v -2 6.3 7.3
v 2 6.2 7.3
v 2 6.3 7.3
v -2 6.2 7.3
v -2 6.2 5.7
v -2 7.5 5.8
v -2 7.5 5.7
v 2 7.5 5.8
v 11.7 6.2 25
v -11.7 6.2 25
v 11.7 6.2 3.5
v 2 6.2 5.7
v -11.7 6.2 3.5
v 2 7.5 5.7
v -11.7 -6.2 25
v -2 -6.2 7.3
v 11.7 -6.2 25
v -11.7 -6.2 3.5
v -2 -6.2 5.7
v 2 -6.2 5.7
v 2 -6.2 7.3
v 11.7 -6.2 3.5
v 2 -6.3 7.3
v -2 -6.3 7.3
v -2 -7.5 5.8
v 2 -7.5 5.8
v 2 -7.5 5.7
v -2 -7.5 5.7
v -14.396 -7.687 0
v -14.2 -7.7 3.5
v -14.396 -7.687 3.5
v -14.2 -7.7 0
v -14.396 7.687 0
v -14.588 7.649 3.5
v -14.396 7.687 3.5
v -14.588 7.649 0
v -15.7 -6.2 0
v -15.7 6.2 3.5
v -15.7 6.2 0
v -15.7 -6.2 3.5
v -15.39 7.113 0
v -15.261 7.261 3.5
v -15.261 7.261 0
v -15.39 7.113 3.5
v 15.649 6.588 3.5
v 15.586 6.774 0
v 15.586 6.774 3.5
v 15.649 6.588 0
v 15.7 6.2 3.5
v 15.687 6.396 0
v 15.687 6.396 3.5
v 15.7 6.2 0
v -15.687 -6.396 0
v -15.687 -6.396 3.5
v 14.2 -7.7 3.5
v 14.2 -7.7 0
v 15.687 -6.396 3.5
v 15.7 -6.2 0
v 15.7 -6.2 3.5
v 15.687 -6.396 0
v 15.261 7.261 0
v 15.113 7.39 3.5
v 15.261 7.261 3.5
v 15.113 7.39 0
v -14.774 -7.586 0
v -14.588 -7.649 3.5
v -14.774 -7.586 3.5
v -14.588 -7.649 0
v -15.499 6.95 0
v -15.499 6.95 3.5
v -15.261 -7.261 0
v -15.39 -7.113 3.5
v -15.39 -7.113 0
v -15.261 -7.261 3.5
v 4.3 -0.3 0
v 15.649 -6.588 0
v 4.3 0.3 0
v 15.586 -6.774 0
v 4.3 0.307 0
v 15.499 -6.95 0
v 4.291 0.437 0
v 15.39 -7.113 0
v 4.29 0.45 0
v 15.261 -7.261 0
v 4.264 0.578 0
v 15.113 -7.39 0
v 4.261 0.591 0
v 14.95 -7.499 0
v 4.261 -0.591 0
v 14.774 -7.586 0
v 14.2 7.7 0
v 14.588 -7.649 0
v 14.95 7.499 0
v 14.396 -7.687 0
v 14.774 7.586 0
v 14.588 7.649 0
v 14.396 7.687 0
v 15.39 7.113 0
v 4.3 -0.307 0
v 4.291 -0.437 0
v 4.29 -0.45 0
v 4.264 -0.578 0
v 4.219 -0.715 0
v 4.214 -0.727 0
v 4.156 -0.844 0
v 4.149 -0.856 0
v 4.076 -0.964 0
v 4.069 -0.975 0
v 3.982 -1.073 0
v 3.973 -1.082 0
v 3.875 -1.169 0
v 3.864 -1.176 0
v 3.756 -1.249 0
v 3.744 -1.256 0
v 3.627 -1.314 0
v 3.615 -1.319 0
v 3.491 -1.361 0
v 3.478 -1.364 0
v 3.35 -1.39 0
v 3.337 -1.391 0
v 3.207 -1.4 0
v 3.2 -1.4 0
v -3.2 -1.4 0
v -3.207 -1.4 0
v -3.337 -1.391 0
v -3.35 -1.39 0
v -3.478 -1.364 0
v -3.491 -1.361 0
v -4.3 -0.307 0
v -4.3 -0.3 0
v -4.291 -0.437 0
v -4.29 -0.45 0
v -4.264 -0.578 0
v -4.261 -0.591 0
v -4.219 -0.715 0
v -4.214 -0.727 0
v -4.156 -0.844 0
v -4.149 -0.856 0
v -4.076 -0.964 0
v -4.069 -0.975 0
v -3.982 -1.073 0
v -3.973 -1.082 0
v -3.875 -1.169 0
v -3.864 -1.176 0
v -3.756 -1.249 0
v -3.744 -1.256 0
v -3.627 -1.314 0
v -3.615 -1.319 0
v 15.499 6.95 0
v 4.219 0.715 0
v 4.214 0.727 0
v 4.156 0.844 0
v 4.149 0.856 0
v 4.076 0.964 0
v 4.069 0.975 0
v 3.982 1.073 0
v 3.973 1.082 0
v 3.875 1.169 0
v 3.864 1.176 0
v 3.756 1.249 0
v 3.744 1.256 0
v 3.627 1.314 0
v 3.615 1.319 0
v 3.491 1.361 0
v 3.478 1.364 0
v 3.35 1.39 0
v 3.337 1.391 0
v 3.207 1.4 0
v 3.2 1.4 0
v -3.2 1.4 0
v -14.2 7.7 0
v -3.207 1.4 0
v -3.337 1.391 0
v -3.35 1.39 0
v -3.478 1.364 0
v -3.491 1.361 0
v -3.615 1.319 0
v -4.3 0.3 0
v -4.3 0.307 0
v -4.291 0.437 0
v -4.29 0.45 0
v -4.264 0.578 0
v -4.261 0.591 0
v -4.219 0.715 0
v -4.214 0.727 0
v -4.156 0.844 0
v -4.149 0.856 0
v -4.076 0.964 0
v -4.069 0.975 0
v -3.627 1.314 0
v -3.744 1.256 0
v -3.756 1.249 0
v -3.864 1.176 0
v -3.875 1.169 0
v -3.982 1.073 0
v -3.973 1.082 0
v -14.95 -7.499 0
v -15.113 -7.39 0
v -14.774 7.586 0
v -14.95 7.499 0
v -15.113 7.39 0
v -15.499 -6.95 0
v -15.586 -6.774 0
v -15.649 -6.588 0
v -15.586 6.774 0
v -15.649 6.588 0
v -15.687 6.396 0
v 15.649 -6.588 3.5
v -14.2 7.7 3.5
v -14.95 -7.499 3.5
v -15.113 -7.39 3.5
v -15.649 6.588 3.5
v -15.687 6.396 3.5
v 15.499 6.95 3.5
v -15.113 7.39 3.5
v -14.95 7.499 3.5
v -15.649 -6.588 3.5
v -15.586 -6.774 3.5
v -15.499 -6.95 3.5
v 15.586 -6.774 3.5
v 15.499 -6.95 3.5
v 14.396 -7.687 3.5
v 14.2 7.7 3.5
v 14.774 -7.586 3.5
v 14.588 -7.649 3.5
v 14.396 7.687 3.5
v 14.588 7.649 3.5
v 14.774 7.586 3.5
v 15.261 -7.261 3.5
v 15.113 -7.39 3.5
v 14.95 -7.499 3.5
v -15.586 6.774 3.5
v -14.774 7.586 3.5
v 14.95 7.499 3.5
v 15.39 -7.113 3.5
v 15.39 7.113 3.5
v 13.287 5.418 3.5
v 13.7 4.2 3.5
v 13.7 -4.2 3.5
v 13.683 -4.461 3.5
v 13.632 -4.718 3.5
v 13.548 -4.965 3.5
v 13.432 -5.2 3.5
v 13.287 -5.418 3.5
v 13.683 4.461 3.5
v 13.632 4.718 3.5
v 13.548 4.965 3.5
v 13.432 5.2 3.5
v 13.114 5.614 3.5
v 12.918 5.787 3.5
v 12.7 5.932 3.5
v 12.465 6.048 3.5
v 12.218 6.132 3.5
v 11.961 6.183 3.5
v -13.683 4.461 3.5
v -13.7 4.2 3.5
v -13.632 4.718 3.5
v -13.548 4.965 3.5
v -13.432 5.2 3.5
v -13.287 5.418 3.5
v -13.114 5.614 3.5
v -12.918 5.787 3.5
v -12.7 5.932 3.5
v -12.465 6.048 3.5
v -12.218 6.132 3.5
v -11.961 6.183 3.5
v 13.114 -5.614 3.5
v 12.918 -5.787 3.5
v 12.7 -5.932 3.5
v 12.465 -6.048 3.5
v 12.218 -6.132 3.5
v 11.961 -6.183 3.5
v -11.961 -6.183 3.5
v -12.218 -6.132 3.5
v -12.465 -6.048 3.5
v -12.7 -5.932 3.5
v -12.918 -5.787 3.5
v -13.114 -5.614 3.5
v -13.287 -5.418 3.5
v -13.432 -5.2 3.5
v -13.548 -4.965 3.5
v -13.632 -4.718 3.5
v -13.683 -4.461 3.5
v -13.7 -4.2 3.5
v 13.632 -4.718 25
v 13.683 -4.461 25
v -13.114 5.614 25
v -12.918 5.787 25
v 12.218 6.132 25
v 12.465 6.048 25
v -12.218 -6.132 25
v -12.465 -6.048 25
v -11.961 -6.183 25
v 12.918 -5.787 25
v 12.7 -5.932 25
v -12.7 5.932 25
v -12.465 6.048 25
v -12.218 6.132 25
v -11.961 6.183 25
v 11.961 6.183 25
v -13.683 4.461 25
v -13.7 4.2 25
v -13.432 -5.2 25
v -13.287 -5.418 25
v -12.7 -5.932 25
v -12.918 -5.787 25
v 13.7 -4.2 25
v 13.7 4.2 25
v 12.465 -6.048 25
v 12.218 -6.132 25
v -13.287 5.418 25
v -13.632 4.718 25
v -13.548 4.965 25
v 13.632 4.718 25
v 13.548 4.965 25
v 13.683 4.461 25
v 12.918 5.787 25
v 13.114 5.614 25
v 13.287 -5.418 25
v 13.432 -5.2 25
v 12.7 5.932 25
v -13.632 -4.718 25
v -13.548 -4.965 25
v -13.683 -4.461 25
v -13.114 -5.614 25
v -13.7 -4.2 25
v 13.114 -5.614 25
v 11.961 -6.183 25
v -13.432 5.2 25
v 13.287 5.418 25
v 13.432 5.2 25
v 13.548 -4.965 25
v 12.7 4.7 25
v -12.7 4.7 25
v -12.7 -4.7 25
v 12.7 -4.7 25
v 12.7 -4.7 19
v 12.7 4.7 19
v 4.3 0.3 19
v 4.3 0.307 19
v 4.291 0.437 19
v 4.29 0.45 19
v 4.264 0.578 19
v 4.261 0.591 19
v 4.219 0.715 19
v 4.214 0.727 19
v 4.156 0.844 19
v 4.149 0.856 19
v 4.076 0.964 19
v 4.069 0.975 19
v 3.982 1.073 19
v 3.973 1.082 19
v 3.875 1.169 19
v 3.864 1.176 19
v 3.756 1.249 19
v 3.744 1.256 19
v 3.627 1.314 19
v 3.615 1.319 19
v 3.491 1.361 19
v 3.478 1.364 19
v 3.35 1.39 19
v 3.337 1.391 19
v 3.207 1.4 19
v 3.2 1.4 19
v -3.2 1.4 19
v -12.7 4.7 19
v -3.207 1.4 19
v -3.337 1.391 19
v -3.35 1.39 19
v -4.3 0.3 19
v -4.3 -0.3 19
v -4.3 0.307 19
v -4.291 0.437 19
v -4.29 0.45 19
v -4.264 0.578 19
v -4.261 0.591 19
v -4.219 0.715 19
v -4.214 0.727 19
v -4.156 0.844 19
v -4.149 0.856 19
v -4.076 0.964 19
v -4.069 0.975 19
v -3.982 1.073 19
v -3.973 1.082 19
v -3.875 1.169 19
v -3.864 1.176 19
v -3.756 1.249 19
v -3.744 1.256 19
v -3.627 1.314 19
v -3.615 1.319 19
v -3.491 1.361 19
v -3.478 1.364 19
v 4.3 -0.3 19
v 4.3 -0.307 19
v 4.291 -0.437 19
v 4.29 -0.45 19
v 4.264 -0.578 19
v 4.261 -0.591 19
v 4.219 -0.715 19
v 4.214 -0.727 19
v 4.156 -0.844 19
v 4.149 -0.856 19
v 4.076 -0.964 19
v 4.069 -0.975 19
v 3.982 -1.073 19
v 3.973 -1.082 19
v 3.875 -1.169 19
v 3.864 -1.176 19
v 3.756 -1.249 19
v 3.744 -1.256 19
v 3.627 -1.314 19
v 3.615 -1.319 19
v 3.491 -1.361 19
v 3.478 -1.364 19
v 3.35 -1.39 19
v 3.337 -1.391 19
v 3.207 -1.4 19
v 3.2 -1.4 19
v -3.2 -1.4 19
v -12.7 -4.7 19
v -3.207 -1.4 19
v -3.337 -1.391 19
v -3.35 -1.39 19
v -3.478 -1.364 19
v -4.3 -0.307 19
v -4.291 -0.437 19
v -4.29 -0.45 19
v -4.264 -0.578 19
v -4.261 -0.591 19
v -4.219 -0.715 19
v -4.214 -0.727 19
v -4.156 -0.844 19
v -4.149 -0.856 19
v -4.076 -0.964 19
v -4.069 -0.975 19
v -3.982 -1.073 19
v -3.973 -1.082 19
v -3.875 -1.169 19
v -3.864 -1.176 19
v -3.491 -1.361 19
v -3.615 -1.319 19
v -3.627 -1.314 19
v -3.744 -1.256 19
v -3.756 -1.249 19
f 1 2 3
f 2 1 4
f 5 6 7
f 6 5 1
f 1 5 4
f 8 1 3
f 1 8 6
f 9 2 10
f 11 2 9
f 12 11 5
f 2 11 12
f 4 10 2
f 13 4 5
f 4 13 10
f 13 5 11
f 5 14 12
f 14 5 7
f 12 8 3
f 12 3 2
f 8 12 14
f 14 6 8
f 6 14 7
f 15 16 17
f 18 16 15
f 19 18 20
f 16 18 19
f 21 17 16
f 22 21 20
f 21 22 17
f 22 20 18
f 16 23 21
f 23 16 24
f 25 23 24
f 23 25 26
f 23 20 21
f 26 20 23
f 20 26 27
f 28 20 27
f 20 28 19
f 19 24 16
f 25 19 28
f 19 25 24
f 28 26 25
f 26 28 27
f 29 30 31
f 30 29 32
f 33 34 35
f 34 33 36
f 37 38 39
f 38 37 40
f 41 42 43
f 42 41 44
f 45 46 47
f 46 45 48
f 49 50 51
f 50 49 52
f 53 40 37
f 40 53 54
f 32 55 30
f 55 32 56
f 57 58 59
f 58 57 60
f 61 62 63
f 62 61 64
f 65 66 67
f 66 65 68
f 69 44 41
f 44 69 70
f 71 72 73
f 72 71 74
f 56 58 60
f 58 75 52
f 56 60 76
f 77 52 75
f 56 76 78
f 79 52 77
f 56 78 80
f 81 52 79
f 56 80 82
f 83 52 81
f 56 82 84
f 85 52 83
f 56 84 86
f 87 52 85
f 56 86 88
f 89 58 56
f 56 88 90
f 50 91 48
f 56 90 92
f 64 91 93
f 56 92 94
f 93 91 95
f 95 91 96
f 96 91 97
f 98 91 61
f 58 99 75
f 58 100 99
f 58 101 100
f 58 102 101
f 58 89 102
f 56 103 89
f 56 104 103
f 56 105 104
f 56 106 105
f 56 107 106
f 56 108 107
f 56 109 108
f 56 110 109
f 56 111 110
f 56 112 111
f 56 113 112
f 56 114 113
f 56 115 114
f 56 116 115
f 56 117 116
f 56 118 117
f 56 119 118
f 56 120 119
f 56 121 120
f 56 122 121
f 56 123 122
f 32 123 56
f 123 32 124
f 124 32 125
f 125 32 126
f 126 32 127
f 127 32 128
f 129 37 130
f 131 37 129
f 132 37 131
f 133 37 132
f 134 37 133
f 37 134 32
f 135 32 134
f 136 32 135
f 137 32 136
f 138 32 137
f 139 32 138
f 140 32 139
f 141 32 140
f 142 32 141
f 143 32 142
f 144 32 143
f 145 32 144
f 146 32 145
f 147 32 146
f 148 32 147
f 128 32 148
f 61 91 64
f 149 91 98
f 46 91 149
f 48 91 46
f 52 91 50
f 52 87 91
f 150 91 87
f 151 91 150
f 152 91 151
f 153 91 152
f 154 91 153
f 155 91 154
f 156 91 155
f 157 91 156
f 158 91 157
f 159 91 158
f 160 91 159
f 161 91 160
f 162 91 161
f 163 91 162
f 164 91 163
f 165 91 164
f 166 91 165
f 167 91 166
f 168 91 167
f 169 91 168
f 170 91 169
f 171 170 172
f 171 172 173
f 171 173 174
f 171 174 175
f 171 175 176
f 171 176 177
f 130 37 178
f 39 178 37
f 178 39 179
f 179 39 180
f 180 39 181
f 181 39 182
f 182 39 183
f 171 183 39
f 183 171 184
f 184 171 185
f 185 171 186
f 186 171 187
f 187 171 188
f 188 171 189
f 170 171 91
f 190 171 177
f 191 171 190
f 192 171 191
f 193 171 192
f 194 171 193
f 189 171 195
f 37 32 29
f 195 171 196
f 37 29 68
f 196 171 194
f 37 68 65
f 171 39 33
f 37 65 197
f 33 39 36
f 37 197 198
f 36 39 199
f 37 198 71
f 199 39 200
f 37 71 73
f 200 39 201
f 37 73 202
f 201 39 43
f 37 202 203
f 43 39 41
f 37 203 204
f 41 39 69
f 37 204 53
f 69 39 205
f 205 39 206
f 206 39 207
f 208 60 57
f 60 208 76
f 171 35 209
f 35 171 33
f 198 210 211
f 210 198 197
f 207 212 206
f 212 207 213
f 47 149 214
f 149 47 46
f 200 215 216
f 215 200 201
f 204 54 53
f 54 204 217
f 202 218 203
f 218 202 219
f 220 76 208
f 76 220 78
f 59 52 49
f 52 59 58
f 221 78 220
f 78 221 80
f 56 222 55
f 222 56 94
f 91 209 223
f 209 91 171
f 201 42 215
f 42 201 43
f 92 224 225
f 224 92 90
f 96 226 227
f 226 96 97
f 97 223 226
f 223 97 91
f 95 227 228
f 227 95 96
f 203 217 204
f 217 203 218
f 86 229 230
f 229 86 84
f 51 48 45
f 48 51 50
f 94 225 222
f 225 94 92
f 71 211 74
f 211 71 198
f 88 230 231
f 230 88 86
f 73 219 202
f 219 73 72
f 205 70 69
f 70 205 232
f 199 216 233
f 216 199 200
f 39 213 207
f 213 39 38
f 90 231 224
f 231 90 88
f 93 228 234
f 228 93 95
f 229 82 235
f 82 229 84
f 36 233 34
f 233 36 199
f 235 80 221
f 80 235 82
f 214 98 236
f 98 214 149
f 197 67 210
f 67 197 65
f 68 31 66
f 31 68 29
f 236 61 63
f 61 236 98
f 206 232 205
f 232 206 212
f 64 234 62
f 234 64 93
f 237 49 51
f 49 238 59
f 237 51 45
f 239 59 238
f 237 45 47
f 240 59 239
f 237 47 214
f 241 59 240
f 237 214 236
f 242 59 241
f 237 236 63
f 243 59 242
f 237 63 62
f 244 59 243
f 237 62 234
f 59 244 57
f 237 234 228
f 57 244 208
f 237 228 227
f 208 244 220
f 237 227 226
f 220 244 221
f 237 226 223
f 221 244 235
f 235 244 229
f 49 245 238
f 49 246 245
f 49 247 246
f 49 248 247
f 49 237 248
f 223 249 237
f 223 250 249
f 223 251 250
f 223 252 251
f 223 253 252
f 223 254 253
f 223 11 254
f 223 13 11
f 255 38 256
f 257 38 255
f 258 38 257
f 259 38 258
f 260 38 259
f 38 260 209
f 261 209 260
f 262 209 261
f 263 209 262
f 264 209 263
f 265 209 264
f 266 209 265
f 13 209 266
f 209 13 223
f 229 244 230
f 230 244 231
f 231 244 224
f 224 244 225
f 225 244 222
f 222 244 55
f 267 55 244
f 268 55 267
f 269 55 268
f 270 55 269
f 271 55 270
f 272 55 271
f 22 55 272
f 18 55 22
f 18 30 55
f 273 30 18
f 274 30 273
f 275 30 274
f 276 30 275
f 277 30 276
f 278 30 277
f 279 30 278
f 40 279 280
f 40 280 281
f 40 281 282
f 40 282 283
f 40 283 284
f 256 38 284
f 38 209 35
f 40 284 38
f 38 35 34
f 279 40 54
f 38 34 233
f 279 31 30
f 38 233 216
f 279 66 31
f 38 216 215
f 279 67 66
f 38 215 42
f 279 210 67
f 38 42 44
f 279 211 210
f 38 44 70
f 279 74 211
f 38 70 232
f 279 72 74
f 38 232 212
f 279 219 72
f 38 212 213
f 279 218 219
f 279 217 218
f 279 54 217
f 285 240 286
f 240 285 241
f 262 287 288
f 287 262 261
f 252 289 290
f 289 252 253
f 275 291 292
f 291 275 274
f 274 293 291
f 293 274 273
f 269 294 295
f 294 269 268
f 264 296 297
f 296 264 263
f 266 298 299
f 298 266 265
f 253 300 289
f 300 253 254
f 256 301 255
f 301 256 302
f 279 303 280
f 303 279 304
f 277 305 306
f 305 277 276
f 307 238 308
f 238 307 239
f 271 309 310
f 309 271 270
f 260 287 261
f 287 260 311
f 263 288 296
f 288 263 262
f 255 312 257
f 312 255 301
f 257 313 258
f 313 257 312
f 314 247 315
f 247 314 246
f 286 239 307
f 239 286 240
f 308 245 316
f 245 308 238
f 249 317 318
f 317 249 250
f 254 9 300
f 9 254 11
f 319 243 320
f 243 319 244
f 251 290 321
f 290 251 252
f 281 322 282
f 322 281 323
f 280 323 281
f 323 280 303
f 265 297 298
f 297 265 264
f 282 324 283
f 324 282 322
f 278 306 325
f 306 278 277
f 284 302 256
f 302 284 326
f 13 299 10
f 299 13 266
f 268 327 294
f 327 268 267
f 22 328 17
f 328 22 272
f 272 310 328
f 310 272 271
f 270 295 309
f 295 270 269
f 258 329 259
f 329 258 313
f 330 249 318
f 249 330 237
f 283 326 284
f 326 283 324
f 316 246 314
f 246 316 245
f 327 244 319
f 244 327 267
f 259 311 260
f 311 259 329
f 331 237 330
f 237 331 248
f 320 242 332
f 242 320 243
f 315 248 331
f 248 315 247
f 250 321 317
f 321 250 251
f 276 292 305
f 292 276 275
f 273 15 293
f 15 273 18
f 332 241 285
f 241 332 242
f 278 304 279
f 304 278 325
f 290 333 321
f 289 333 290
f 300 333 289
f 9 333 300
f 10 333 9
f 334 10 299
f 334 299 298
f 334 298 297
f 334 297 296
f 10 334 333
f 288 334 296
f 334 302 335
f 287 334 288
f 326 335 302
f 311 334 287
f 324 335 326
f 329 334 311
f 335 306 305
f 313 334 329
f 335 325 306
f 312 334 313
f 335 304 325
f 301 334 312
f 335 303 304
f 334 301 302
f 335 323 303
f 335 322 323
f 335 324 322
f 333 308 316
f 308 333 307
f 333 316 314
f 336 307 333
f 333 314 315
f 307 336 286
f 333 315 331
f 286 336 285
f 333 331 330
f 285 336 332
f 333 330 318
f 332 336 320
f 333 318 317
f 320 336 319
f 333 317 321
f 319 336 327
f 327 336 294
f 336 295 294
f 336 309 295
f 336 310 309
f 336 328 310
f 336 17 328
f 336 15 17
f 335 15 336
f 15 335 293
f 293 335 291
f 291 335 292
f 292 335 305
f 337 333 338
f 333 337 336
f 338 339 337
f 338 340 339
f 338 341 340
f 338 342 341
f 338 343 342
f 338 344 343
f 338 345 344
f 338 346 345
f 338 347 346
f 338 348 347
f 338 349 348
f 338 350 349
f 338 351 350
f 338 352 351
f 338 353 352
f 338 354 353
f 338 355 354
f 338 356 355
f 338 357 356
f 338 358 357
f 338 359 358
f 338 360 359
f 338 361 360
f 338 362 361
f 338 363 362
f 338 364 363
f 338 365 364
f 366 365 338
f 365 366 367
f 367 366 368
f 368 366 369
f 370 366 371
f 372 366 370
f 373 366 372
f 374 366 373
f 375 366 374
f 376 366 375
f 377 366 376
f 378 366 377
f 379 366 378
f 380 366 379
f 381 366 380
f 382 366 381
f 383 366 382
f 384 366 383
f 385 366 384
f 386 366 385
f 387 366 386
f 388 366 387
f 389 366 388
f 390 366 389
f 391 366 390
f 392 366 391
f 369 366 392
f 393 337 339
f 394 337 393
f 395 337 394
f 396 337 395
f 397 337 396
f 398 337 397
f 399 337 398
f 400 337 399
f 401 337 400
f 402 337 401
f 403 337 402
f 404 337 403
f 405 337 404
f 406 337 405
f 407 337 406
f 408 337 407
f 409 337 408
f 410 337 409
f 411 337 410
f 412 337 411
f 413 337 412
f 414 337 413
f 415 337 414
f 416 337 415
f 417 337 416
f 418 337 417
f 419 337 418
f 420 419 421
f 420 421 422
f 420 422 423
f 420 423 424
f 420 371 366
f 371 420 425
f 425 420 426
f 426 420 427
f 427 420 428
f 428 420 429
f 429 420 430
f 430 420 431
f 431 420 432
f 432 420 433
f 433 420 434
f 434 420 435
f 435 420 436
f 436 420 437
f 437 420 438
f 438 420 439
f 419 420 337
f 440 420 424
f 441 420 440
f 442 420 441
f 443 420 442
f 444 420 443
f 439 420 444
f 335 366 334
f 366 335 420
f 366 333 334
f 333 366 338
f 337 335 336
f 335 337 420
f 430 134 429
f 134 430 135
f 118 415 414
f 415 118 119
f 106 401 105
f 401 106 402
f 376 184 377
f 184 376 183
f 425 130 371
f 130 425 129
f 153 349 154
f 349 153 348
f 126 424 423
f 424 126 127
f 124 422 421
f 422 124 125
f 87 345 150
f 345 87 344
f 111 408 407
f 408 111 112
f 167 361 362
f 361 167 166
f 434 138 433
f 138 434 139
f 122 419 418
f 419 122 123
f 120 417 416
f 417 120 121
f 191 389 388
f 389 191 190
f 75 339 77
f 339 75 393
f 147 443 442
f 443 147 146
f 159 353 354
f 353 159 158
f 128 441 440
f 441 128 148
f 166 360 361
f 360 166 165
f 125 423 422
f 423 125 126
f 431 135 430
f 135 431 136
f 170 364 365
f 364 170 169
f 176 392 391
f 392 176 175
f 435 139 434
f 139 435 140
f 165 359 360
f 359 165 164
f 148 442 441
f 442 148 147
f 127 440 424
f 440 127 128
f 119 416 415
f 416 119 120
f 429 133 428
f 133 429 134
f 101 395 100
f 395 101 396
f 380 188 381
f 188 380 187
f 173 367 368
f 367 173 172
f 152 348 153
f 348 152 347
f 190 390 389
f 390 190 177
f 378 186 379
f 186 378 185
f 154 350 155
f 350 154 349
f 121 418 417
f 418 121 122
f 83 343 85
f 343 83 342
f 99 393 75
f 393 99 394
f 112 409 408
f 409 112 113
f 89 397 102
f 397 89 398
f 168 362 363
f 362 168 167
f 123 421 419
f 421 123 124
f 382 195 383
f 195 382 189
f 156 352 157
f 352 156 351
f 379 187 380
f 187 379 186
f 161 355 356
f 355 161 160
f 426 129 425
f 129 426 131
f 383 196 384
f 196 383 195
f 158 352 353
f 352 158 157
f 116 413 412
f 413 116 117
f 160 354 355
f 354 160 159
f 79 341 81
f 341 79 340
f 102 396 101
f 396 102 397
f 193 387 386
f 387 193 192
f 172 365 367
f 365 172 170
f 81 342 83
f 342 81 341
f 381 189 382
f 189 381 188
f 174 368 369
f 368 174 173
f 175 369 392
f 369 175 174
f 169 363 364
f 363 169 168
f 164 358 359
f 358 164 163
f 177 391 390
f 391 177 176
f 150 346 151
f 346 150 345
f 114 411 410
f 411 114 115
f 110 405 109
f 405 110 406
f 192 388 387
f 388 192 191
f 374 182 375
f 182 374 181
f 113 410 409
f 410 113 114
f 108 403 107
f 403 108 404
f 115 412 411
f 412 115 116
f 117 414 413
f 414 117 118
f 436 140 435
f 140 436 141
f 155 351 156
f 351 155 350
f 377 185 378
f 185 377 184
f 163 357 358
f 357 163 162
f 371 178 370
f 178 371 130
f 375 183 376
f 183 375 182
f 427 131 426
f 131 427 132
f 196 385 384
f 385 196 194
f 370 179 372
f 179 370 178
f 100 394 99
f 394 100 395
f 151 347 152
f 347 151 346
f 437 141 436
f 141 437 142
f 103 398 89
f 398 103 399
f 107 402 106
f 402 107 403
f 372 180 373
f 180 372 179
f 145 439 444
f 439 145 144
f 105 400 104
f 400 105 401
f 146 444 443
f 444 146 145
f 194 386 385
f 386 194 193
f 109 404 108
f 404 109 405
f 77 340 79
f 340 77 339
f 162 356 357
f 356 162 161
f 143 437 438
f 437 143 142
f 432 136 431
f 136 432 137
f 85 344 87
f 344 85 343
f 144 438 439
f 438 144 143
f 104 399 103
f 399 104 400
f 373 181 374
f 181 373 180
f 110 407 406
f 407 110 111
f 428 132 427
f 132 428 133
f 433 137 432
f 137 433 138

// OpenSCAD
// file: parameters.scad
// ============================================
// MODULAR CABLE ORGANIZER - SHARED PARAMETERS
// ============================================
// All dimensions in mm - include this in all files
// ============================================

$fn = 48;

// === TOLERANCES ===
clearance = 0.3;
port_clearance = 0.1;  // Extra clearance for port openings (reduced - 0.2 was too loose for USB-C)
wall = 1.6;

// === SLOT DIMENSIONS (2:1 aspect ratio) - scaled to 2/3 ===
slot_width = 32;  // Standard wide slot for larger connectors
slot_width_narrow = 16;  // Narrow slot for compact connectors (USB-C, micro-USB, USB-A, Lightning, 3.5mm)
slot_height = 16;  // Height is same for both wide and narrow
slot_depth = 4;  // Reduced from 6mm - less frame depth needed

// === FRAME STRUCTURE ===
frame_wall = 2.0;   // Wall between slots - 6 layers @ 0.4mm nozzle for strength
frame_border = 6;  // Increased by 10mm for mounting holes with countersink
frame_back = 2;     // Slightly thicker for snap catch strength
mount_hole_dia = 3;
countersink_dia = 6;  // Diameter of countersink for screw heads
countersink_depth = 2;  // Depth of countersink

// === DEFAULT GRID (can be overridden in individual files) ===
grid_cols = 2;
grid_rows = 2;

// === INSERT BASE DIMENSIONS ===
insert_width = slot_width - (2 * clearance);
insert_height = slot_height - (2 * clearance);
insert_base_depth = slot_depth - 0.5;

// === NARROW INSERT BASE DIMENSIONS ===
insert_width_narrow = slot_width_narrow - (2 * clearance);
insert_height_narrow = slot_height - (2 * clearance);

// === INSERT BODY (protrudes from frame) ===
insert_body_width = insert_width - 4;
insert_body_height = insert_height - 3;
insert_body_depth = 15.5;  // Standardized depth (USB-B 15.26mm + 0.25mm buffer) - all inserts same height
insert_top_thick = 1.5;  // Top platform thickness

// === NARROW INSERT BODY (protrudes from frame) ===
insert_body_width_narrow = insert_width_narrow - 4;
insert_body_height_narrow = insert_height_narrow - 3;

// === SNAP TABS (on neck/body - catch on back plate) ===
snap_tab_width = 4;
snap_tab_protrude = 1.2;  // How far tab sticks out from body
snap_tab_thick = 1.5;     // Z thickness of tab
snap_tab_offset = 2.2;      // Distance from base to tab bottom on insert (increased to clear frame)

// === CONNECTOR PORT DIMENSIONS & BODY DEPTHS ===
// Port dimensions from reference blueprints
// Body depths sized to match typical male connector lengths

// USB-C: 8.4 x 2.6mm, male connector ~9mm
usbc_w = 8.4;
usbc_h = 2.6;
usbc_r = 1.0;
usbc_body_depth = 15.5;  // Standardized depth (USB-B 15.26mm + 0.25mm buffer)
// NO RETENTION RIBS for USB-C (removed per user request)

// USB-A: 13.0 x 4.5mm (standard male USB-A height)
usba_w = 13.0;
usba_h = 4.5;  // Match actual male USB-A height
usba_r = 0.5;
usba_body_depth = 15.5;  // Standardized depth (USB-B 15.26mm + 0.25mm buffer)
usba_retention_rib_depth = 5.0;  // Distance from front (moved back 1mm so ribs don't break)
usba_retention_rib_size = 0.15;  // How far ribs protrude inward

// USB Mini: 6.9 x 3.0mm, male connector ~9mm
usb_mini_w = 6.9;
usb_mini_h = 3.0;
usb_mini_r = 0.5;
usb_mini_body_depth = 15.5;  // Standardized depth (USB-B 15.26mm + 0.25mm buffer)
usb_mini_retention_rib_depth = 3.5;  // Distance from front where retention ribs start
usb_mini_retention_rib_size = 0.125;  // Reduced to half (was 0.25)

// USB Micro-B: 7.4 x 1.8mm (wider to fit corners of trapezoid)
usb_micro_w = 7.4;  // Increased width for corners
usb_micro_h = 1.8;
usb_micro_r = 0.3;
usb_micro_body_depth = 15.5;  // Standardized depth (USB-B 15.26mm + 0.25mm buffer)
usb_micro_retention_rib_depth = 4.5;  // Distance from front (moved back 1mm so ribs don't break)
usb_micro_retention_rib_size = 0.125;  // How far ribs protrude inward

// USB-B: 8.75 x 7.78mm (standard male USB-B height)
usb_b_w = 8.75;  // Width at bottom (wider)
usb_b_h = 7.78;  // Match actual male USB-B height (reduced from 7.9)
usb_b_r = 0.6;   // Corner radius
usb_b_top_inset = 0.9;  // How much narrower the top is (creates trapezoid shape)
usb_b_body_depth = 15.5;  // Standardized depth (15.26mm connector + 0.25mm buffer)
usb_b_retention_rib_depth = 5.5;  // Distance from front (moved back 1mm so ribs don't break)
usb_b_retention_rib_size = 0.15;  // How far ribs protrude inward

// Lightning: 7.6 x 1.5mm, male connector ~8mm (measured from actual connector)
lightning_w = 7.6;
lightning_h = 1.5;
lightning_r = 0.5;
lightning_body_depth = 15.5;  // Standardized depth (USB-B 15.26mm + 0.25mm buffer)
lightning_retention_rib_depth = 4.0;  // Distance from front (moved back 1mm so ribs don't break)
lightning_retention_rib_size = 0.1;   // How far ribs protrude inward

// HDMI: 14.65 x 4.45mm (standard male HDMI height)
hdmi_w = 14.65;
hdmi_h = 4.45;  // Match actual male HDMI height
hdmi_r = 0.5;
hdmi_body_depth = 15.5;  // Standardized depth (USB-B 15.26mm + 0.25mm buffer)
hdmi_retention_rib_depth = 6.0;  // Distance from front (moved back 1mm so ribs don't break)
hdmi_retention_rib_size = 0.1;   // How far ribs protrude inward

// 3.5mm Audio Jack: standard 3.5mm (1/8") diameter
audio_jack_dia = 3.6;  // 3.5mm + 0.1mm for less snug fit
audio_jack_body_depth = 15.5;  // Standardized depth (USB-B 15.26mm + 0.25mm buffer)
// Ring positions for TRS/TRRS ribs (tip, ring1, ring2 from front)
audio_jack_ring1 = 3.5;  // First ring position from front
audio_jack_ring2 = 6.5;  // Second ring position from front

// Blank/Label: recessed area for label
label_w = 30;
label_h = 12;
label_depth = 0.8;

// AC Power Plug: asymmetric holes for polarity (US 2-prong)
// Prongs are VERTICAL (tall and thin)
// Hot prong (narrower): 1.6mm wide x 6.5mm tall
// Neutral prong (wider): 1.6mm wide x 8.5mm tall (increased)
power_hot_w = 1.6;   // Width (thin dimension)
power_hot_h = 6.5;   // Height (tall dimension)
power_neutral_w = 1.6;   // Width (thin dimension)
power_neutral_h = 8.5;   // Height (tall dimension, increased from 8.1)
power_prong_spacing = 12.7;  // 0.5" center-to-center
power_body_depth = 15.5;  // Standardized depth (USB-B 15.26mm + 0.25mm buffer)

// === CALCULATED VALUES ===
frame_total_depth = frame_back + slot_depth;
grid_width = (grid_cols * slot_width) + ((grid_cols - 1) * frame_wall);
grid_height = (grid_rows * slot_height) + ((grid_rows - 1) * frame_wall);
frame_width = grid_width + (2 * frame_border);
frame_height_total = grid_height + (2 * frame_border);
insert_total_depth = insert_base_depth + insert_body_depth;
// main file
// ============================================
// PRINT FILE: Universal HDMI Adapter Insert
// ============================================
// Accepts HDMI male connector on front
// Routes to 24-pin universal interface on rear
// NOTE: Requires active TMDS-to-DP converter IC
// ============================================

include <insert_universal_base.scad>

// Render the universal HDMI adapter
insert_universal_hdmi();
